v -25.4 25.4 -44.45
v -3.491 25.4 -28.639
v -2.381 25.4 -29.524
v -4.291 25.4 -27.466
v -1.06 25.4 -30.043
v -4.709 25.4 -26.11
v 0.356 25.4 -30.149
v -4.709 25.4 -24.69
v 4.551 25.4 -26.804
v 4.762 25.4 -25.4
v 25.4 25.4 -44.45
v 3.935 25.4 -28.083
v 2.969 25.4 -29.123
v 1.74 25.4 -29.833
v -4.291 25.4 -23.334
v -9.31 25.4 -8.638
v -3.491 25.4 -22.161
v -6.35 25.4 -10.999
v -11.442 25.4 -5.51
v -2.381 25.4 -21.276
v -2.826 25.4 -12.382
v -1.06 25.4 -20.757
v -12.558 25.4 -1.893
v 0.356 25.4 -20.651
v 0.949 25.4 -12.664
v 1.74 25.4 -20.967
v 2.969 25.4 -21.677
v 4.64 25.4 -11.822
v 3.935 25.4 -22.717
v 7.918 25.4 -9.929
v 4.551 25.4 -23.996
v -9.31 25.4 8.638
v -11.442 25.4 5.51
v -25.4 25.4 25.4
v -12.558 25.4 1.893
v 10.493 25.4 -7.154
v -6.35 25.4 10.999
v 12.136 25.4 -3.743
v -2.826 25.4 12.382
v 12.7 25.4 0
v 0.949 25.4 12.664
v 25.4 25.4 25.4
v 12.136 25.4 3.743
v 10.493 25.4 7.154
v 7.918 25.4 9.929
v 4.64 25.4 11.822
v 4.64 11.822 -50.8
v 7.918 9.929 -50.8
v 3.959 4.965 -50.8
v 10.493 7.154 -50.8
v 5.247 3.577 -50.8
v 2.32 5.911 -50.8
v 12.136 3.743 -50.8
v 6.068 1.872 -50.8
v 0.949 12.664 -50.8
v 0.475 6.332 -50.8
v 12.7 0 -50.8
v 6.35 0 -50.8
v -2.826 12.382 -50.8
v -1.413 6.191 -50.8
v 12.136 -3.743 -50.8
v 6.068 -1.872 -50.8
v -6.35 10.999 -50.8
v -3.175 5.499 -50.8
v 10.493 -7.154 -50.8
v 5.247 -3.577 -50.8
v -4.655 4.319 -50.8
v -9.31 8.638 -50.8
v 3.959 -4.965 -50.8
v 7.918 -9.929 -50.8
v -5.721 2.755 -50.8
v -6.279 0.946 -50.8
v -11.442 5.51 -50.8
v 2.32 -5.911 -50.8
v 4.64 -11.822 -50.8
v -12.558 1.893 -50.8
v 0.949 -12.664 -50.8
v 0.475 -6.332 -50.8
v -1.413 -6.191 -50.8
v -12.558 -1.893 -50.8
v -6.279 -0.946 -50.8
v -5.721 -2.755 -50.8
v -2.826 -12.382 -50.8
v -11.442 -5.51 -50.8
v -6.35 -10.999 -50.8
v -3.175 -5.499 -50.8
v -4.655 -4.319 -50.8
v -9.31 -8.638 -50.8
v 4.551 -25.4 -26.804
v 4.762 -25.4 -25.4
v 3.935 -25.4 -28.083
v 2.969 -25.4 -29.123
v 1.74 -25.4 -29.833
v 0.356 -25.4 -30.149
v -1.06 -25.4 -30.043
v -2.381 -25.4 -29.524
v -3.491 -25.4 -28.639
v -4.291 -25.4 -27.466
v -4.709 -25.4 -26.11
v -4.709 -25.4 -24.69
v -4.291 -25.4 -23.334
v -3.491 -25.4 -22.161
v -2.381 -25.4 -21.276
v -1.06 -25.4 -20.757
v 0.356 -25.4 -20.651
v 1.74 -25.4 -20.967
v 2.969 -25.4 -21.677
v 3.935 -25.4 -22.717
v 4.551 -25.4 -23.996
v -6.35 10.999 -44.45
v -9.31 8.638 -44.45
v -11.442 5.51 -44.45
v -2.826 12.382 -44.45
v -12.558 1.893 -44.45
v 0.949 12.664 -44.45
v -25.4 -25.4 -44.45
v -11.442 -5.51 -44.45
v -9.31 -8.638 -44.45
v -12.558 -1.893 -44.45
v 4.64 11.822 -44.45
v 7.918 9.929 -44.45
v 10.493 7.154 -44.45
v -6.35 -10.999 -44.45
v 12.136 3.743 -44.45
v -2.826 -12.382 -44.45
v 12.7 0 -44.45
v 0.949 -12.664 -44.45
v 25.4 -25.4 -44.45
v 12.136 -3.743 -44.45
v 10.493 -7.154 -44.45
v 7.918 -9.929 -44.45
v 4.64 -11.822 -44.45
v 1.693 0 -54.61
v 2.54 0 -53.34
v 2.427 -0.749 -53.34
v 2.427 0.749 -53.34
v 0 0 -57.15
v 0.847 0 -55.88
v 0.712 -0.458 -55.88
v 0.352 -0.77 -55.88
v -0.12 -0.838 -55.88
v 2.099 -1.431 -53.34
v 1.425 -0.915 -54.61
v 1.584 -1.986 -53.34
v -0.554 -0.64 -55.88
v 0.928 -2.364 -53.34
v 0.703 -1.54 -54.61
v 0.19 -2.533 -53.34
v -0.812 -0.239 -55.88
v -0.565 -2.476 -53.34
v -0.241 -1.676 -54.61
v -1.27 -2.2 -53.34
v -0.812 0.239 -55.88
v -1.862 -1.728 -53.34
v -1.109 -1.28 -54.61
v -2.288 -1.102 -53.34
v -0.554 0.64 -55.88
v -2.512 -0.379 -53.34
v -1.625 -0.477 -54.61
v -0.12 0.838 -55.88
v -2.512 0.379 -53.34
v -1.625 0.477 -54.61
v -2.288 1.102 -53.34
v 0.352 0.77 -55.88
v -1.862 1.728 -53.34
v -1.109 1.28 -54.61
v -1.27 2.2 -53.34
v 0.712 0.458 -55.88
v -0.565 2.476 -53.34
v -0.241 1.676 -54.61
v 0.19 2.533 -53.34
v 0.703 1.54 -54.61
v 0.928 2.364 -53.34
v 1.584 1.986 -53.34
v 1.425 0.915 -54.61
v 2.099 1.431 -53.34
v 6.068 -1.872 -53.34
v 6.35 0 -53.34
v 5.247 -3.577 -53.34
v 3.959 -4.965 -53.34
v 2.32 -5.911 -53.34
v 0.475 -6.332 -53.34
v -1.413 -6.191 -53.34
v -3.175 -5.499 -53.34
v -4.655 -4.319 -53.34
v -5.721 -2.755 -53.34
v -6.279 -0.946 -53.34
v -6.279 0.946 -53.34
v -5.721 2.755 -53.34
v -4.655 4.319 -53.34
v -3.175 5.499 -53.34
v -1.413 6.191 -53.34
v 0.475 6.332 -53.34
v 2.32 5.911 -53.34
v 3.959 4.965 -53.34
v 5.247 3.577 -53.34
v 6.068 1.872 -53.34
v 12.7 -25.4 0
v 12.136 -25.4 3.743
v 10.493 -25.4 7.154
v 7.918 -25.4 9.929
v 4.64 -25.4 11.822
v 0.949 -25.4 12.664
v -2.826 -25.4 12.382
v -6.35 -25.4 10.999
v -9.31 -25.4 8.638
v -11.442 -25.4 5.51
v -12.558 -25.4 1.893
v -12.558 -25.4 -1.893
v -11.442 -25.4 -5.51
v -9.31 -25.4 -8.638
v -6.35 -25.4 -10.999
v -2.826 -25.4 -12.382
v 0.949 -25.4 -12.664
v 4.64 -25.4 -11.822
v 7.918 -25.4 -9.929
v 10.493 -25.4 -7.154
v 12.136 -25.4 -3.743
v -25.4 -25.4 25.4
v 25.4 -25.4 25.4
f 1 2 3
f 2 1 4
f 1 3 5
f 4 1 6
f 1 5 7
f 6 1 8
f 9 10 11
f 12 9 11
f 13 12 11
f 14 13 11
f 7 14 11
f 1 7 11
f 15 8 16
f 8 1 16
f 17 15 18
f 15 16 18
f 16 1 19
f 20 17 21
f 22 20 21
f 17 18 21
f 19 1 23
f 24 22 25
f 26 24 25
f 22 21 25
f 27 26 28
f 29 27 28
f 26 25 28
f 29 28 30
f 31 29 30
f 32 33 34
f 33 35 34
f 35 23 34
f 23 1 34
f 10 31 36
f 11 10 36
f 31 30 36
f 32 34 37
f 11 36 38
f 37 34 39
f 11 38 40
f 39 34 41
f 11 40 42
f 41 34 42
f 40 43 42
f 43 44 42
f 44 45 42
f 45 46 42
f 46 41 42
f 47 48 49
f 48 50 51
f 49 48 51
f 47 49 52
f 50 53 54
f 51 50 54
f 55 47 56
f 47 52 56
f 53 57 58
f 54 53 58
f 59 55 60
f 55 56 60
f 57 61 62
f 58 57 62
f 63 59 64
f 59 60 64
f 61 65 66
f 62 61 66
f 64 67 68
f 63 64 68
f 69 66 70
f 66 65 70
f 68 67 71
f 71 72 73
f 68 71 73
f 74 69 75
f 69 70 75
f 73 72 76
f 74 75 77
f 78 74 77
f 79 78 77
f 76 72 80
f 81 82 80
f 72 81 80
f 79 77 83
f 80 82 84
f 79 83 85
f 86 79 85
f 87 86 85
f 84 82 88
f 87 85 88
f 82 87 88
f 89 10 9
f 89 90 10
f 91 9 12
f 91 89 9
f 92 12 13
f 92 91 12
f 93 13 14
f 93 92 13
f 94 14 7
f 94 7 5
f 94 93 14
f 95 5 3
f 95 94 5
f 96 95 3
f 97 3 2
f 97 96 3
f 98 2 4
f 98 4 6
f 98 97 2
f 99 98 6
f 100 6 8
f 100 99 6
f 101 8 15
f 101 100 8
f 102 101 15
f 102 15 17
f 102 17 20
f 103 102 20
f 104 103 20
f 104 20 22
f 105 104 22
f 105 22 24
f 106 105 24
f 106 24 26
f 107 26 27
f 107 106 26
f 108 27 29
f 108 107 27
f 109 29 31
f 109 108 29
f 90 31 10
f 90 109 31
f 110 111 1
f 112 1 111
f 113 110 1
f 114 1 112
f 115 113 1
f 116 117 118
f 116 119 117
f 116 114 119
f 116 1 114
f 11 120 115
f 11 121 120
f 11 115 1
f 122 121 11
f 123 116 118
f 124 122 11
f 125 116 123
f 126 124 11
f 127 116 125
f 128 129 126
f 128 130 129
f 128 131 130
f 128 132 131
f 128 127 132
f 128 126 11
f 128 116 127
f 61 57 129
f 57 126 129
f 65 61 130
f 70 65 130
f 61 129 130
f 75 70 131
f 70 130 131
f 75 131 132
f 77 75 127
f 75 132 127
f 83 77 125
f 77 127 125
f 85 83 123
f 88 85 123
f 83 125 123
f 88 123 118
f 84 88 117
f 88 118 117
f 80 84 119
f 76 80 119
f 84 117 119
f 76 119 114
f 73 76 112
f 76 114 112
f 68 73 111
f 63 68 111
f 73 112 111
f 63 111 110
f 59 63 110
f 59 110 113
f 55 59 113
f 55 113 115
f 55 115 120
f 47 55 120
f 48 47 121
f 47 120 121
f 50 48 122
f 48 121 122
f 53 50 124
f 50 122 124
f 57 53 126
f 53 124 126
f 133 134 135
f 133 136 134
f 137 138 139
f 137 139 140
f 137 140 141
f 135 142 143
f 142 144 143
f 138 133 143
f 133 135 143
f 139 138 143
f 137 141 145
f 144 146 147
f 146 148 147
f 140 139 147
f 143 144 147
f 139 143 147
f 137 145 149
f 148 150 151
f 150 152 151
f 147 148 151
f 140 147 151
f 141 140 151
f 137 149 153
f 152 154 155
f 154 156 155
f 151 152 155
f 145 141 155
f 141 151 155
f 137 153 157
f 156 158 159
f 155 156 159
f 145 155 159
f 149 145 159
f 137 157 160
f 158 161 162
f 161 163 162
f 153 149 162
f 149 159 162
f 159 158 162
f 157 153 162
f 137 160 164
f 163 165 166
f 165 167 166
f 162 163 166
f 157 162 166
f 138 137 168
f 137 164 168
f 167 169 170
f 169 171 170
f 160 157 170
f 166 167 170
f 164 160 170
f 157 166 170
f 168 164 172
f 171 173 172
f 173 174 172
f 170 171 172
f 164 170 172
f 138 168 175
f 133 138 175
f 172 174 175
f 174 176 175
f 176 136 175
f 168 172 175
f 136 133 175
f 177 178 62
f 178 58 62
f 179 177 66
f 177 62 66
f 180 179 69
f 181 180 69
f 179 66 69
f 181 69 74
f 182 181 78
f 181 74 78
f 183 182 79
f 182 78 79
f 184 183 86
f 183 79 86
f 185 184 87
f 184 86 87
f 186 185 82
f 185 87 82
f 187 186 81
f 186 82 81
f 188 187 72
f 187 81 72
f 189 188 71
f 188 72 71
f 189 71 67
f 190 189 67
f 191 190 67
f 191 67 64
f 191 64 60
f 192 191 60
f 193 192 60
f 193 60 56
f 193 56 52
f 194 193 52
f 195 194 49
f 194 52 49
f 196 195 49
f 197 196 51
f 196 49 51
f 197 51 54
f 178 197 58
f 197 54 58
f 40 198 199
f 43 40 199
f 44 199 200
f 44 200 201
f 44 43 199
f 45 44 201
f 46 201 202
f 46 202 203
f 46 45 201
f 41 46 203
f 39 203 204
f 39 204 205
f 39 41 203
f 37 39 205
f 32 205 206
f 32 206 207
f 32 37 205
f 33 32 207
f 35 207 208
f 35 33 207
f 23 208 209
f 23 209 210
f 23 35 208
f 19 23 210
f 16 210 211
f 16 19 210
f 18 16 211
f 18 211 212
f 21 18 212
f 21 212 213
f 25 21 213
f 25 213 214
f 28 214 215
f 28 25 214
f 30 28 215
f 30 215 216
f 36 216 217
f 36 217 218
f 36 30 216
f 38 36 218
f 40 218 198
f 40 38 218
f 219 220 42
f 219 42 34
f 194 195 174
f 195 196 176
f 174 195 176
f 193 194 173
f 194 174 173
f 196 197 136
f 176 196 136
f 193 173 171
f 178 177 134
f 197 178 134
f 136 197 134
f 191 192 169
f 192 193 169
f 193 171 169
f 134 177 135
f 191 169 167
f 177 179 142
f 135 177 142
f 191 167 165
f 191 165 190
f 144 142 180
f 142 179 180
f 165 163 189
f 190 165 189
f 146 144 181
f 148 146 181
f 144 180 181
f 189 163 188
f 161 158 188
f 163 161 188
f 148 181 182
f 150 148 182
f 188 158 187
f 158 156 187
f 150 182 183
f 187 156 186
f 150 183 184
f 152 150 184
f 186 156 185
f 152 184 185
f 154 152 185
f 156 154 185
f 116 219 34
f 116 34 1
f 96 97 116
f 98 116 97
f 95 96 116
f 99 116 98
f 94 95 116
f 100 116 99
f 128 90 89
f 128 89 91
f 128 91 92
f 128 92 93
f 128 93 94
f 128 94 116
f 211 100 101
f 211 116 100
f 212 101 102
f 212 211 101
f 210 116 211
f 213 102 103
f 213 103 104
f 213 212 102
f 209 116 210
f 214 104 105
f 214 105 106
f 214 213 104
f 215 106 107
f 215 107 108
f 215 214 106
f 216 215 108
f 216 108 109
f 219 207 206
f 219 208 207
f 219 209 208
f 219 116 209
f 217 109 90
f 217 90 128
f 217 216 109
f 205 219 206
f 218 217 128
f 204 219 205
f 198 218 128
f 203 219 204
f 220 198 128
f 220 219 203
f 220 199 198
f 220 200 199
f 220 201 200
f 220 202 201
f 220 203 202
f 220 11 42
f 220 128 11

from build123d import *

# Parameters (mm, degrees)
F0_R     = 12.7
F1_DEPTH = 25.4


with BuildPart() as f1:
    # F0 (on Front) → F1 (new body, symmetric)
    with BuildSketch(Plane.XZ):
        Polygon((-12.7, -44.45), (0, -44.45), (12.7, -44.45), (25.4, -44.45), (25.4, 25.4), (-25.4, 25.4), (-25.4, -44.45), align=None)
        with BuildLine():
            ThreePointArc((0, -30.1625), (-3.3675960454, -22.0324039546), (4.7625, -25.4))
            ThreePointArc((4.7625, -25.4), (3.3675960454, -28.7675960454), (0, -30.1625))
        make_face(mode=Mode.SUBTRACT)
        Circle(F0_R, mode=Mode.SUBTRACT)
    extrude(amount=F1_DEPTH, both=True)

    # F0 (on Front) → F2 (revolve)
    with BuildSketch(Plane.XZ):
        Polygon((12.7, -44.45), (0, -44.45), (0, -50.8), (6.35, -50.8), (12.7, -50.8), align=None)
        Polygon((6.35, -50.8), (0, -50.8), (0, -53.34), (2.54, -53.34), (6.35, -53.34), align=None)
        Polygon((2.54, -53.34), (0, -53.34), (0, -57.15), align=None)
    revolve(axis=Axis((0, 0, -41.275), (0, 0, -1)))


solid = f1.part
